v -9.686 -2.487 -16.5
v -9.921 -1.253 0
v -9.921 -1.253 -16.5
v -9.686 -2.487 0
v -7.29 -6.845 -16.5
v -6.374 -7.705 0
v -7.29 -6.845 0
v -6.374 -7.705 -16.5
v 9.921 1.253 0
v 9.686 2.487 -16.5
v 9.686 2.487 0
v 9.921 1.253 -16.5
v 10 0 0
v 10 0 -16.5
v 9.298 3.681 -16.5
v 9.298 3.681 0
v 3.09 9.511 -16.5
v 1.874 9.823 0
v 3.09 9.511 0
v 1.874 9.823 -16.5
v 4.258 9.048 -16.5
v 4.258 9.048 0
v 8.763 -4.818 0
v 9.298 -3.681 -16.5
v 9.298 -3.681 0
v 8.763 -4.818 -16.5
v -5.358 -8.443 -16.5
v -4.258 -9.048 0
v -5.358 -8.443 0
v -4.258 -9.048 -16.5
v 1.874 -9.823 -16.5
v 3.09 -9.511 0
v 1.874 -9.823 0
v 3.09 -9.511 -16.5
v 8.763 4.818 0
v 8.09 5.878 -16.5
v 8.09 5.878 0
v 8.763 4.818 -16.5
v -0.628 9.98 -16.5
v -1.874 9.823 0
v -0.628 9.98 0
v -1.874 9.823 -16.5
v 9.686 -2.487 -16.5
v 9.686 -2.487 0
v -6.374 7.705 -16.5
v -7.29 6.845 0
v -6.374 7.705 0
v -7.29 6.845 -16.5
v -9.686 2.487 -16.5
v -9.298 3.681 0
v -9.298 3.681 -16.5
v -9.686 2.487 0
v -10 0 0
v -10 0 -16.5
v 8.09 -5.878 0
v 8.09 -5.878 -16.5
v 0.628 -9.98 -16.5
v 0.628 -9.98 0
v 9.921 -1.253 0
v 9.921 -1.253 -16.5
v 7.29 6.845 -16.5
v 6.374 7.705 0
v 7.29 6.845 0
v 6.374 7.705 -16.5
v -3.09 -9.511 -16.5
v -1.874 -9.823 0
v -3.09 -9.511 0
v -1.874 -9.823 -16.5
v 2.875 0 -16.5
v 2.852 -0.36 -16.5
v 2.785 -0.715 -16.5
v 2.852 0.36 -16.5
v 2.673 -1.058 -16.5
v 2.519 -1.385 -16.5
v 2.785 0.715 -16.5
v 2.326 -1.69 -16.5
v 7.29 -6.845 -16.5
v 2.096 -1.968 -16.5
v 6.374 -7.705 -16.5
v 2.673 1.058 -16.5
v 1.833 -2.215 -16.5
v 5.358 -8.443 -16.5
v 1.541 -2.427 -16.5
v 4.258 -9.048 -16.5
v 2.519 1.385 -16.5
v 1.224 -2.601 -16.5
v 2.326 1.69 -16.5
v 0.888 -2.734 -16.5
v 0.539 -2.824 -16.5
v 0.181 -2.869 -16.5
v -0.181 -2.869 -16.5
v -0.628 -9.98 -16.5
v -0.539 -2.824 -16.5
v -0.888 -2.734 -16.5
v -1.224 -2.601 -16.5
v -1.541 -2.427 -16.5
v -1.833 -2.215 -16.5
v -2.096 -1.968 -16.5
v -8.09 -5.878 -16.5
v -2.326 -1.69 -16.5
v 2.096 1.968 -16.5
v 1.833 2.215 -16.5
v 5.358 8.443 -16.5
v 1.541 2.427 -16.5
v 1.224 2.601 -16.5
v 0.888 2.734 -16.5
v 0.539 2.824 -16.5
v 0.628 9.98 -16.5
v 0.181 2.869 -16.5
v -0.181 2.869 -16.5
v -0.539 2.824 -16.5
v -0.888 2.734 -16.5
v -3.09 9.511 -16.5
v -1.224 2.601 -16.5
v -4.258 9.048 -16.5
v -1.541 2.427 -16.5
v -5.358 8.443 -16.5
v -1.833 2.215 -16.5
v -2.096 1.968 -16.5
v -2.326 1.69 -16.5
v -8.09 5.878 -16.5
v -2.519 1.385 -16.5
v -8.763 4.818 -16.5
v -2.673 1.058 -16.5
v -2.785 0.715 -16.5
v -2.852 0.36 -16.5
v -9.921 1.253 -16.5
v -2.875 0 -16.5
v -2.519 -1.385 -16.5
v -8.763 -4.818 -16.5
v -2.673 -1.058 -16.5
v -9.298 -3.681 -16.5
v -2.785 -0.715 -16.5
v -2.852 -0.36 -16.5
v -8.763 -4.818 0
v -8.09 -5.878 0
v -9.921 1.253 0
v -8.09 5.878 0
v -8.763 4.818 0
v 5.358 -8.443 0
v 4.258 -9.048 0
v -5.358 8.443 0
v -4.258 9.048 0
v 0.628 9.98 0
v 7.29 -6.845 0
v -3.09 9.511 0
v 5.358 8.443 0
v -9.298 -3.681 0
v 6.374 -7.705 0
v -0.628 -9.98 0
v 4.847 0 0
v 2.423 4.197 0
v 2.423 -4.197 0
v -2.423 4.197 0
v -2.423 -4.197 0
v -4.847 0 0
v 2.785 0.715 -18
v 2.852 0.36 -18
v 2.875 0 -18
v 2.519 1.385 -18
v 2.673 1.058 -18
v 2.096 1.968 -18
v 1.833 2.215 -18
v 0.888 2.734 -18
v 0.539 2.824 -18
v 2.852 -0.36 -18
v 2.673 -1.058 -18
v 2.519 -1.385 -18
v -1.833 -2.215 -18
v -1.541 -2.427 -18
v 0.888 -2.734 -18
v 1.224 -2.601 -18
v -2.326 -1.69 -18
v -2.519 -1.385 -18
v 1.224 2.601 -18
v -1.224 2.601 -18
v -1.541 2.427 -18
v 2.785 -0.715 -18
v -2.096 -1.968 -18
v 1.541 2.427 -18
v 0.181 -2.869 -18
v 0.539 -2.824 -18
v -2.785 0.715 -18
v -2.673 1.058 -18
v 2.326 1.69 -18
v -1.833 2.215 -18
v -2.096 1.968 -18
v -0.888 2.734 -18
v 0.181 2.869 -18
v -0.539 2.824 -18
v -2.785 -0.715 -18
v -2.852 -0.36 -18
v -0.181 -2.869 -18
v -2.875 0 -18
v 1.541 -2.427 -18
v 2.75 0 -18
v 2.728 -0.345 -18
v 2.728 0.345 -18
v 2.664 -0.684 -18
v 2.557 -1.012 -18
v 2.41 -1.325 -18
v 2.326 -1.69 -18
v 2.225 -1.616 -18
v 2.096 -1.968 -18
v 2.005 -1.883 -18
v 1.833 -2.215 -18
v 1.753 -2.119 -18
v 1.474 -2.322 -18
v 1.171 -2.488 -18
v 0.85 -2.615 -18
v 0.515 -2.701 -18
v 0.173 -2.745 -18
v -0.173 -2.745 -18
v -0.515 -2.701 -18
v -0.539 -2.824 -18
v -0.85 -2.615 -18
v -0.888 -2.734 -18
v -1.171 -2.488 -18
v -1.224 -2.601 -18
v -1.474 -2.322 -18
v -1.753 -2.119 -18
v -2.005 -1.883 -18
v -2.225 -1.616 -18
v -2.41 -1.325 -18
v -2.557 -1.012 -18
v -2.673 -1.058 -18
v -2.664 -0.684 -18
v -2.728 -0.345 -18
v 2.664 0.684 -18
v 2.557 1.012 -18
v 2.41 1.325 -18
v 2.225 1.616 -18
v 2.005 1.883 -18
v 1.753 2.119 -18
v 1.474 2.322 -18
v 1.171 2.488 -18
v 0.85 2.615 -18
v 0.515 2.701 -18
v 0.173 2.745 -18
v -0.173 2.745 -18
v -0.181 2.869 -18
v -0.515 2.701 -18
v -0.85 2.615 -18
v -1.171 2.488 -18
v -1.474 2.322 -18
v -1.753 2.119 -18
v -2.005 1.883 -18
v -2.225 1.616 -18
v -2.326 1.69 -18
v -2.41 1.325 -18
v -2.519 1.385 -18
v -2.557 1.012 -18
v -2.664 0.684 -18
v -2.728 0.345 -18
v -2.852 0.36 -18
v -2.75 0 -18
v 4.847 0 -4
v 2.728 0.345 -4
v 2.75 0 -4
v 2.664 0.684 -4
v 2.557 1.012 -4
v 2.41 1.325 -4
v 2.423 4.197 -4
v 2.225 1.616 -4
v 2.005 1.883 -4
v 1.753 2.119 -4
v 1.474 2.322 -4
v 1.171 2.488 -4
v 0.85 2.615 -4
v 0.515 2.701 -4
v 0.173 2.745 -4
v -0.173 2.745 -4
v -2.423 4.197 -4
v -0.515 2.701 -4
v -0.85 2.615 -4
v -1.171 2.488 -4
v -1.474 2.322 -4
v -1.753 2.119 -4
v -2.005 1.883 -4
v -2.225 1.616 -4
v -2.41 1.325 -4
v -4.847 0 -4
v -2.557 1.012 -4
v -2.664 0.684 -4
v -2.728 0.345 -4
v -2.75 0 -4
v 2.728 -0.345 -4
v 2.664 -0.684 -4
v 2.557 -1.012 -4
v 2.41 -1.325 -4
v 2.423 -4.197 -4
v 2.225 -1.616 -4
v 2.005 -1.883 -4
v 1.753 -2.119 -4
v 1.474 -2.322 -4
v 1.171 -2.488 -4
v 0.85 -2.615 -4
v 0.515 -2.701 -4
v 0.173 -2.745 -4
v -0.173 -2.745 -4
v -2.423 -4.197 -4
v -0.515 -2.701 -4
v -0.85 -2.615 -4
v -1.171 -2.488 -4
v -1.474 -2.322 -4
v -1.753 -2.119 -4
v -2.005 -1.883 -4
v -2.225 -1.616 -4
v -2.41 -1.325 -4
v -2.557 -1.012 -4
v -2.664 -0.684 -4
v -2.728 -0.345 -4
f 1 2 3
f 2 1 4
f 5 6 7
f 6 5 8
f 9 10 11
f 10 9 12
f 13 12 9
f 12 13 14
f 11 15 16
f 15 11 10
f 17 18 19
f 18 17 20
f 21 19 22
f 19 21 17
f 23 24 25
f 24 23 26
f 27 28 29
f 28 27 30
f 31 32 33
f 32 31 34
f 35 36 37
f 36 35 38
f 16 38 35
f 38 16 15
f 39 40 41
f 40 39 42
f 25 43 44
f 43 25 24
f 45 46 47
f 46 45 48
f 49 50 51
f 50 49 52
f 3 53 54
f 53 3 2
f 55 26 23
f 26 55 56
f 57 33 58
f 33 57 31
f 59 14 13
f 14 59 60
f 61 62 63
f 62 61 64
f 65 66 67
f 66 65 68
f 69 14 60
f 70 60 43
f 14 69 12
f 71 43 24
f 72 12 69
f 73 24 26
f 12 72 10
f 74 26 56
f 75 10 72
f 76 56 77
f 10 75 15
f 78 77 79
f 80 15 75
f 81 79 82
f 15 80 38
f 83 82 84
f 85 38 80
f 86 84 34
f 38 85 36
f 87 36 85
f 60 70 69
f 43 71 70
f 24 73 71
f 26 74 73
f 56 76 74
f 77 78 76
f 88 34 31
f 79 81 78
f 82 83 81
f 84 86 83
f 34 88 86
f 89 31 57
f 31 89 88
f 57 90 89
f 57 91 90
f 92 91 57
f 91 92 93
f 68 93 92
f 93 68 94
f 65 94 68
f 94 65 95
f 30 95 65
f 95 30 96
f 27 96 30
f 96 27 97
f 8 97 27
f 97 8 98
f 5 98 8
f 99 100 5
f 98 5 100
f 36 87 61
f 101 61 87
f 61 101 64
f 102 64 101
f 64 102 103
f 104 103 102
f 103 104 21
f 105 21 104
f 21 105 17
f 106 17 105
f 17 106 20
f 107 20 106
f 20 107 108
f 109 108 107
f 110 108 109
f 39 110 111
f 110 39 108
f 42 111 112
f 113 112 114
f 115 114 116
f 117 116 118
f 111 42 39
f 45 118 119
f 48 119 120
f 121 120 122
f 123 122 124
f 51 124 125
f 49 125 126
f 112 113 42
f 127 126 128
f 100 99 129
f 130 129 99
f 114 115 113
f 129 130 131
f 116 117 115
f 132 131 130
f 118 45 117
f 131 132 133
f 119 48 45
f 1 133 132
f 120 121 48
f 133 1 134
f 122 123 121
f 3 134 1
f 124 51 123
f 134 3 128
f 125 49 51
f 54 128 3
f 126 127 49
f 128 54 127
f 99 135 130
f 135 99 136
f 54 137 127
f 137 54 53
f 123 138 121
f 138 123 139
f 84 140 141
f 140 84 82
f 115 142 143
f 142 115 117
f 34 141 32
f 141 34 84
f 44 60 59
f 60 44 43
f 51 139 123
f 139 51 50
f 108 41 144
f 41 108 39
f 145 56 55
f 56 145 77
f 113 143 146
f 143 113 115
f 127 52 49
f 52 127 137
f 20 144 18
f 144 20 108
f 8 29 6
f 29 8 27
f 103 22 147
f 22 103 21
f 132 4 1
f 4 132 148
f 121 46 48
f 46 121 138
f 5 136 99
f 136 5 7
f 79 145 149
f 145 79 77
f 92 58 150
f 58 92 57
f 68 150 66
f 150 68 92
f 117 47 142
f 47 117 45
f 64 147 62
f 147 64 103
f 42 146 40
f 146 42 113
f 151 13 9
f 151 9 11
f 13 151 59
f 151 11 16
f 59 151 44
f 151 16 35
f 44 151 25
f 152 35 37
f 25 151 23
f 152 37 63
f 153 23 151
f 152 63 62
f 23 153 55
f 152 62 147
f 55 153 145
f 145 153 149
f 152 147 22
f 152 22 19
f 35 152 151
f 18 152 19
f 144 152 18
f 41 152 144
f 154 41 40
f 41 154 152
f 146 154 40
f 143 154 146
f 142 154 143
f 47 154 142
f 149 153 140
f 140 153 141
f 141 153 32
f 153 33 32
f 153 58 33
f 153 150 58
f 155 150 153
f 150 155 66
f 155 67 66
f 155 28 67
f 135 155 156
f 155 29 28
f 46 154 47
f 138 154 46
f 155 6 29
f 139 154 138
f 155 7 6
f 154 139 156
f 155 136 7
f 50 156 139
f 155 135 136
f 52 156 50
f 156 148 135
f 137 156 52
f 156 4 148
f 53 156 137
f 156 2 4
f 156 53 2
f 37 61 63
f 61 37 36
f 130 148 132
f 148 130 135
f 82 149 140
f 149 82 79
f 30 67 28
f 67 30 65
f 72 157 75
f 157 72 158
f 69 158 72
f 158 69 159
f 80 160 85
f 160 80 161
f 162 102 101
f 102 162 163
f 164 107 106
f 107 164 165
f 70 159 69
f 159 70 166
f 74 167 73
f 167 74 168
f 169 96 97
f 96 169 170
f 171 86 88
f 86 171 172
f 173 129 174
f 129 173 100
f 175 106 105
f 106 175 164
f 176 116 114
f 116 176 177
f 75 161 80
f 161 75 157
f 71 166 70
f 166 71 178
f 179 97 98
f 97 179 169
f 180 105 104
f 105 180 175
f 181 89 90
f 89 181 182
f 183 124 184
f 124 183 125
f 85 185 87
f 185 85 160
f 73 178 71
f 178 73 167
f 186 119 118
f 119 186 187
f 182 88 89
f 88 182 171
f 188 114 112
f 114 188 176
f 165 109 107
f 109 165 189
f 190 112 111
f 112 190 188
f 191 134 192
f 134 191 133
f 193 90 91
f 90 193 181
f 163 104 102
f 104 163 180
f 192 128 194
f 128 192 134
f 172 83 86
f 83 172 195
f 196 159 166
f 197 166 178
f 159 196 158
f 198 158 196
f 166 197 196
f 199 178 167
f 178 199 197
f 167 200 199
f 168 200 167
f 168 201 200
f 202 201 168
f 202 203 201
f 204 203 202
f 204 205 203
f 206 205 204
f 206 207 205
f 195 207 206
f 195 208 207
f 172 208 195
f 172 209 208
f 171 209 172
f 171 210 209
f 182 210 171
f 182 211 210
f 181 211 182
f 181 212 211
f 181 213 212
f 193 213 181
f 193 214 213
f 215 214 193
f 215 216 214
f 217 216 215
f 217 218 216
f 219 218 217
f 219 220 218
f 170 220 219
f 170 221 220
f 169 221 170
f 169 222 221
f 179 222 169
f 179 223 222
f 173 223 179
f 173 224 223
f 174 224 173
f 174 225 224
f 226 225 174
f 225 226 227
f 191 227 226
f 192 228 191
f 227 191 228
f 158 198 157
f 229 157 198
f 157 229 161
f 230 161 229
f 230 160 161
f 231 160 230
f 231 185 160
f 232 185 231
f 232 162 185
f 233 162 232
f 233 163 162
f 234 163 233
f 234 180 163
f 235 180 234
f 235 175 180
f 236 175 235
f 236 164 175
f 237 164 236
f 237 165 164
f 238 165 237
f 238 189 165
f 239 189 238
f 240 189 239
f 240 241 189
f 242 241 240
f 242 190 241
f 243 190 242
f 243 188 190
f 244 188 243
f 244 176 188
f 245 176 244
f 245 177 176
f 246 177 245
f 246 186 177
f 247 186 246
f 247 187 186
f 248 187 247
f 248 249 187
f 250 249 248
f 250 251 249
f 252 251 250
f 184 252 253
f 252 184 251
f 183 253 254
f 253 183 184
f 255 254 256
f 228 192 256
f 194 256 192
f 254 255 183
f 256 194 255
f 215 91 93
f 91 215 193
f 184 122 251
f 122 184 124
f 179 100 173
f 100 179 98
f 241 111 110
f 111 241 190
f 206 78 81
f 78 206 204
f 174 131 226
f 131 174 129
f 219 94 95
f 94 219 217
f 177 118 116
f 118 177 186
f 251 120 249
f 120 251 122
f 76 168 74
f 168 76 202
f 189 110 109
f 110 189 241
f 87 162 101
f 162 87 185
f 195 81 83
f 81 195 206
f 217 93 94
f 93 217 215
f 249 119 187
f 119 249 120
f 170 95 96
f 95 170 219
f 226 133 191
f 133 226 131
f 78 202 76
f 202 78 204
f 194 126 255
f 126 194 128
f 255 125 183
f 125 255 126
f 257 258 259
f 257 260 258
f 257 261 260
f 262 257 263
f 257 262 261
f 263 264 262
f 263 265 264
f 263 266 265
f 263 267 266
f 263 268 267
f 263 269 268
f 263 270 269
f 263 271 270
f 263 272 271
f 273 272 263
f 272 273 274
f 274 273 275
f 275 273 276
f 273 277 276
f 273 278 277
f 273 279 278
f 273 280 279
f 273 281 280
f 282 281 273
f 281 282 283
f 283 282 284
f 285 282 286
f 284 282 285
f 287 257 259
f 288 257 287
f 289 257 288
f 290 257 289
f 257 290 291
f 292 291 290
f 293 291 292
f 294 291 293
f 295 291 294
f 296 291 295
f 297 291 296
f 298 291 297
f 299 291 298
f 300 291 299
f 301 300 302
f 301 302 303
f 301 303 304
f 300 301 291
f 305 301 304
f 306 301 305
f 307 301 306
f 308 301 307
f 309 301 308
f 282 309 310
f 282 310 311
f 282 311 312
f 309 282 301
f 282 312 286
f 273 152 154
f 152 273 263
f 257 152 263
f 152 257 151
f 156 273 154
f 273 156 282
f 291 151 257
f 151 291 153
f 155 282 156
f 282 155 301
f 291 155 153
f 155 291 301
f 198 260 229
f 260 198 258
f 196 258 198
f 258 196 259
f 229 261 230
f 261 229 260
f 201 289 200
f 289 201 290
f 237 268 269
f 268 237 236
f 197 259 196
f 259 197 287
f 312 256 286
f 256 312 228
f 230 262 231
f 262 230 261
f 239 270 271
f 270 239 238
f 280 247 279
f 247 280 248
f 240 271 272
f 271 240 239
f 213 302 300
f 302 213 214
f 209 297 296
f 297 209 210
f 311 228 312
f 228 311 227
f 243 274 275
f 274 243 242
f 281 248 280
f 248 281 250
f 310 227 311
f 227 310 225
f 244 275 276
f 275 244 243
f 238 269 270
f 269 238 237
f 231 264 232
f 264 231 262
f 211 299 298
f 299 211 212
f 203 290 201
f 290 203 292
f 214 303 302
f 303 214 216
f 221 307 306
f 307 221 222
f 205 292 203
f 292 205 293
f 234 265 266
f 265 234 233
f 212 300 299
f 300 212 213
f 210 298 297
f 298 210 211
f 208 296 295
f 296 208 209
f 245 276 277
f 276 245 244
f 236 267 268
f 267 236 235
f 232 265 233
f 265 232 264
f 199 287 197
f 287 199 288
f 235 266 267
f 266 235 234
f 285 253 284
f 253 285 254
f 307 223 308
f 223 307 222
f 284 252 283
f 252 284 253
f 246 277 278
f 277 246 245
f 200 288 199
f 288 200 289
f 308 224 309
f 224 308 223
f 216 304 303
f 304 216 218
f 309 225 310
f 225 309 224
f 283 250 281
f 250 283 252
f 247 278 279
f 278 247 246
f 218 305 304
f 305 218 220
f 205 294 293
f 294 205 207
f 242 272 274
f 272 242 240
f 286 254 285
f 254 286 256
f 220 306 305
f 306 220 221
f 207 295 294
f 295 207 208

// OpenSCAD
$fn = 50;

difference() {
	union() {
		translate(v = [0, 0, -16.5]) {
			cylinder(h = 16.5, r = 10.0);
		}
		#translate(v = [0, 0, -18.0]) {
			cylinder(h = 18, r = 2.875);
		}
	}
	union() {
		translate(v = [0, 0, 0]) {
			rotate(a = [0, 0, 0]) {
				difference() {
					union() {
						translate(v = [0, 0, -4]) {
							linear_extrude(height = 4) {
								polygon(points = [[4.8468, 0.0], [2.4234000000000004, 4.197451927062417], [-2.423399999999999, 4.197451927062417], [-4.8468, 5.935618106107392e-16], [-2.423400000000002, -4.197451927062416], [2.423399999999997, -4.197451927062419]]);
							}
						}
					}
					union();
				}
			}
		}
		#translate(v = [0, 0, -100.0]) {
			cylinder(h = 200, r = 2.75);
		}
	}
}
